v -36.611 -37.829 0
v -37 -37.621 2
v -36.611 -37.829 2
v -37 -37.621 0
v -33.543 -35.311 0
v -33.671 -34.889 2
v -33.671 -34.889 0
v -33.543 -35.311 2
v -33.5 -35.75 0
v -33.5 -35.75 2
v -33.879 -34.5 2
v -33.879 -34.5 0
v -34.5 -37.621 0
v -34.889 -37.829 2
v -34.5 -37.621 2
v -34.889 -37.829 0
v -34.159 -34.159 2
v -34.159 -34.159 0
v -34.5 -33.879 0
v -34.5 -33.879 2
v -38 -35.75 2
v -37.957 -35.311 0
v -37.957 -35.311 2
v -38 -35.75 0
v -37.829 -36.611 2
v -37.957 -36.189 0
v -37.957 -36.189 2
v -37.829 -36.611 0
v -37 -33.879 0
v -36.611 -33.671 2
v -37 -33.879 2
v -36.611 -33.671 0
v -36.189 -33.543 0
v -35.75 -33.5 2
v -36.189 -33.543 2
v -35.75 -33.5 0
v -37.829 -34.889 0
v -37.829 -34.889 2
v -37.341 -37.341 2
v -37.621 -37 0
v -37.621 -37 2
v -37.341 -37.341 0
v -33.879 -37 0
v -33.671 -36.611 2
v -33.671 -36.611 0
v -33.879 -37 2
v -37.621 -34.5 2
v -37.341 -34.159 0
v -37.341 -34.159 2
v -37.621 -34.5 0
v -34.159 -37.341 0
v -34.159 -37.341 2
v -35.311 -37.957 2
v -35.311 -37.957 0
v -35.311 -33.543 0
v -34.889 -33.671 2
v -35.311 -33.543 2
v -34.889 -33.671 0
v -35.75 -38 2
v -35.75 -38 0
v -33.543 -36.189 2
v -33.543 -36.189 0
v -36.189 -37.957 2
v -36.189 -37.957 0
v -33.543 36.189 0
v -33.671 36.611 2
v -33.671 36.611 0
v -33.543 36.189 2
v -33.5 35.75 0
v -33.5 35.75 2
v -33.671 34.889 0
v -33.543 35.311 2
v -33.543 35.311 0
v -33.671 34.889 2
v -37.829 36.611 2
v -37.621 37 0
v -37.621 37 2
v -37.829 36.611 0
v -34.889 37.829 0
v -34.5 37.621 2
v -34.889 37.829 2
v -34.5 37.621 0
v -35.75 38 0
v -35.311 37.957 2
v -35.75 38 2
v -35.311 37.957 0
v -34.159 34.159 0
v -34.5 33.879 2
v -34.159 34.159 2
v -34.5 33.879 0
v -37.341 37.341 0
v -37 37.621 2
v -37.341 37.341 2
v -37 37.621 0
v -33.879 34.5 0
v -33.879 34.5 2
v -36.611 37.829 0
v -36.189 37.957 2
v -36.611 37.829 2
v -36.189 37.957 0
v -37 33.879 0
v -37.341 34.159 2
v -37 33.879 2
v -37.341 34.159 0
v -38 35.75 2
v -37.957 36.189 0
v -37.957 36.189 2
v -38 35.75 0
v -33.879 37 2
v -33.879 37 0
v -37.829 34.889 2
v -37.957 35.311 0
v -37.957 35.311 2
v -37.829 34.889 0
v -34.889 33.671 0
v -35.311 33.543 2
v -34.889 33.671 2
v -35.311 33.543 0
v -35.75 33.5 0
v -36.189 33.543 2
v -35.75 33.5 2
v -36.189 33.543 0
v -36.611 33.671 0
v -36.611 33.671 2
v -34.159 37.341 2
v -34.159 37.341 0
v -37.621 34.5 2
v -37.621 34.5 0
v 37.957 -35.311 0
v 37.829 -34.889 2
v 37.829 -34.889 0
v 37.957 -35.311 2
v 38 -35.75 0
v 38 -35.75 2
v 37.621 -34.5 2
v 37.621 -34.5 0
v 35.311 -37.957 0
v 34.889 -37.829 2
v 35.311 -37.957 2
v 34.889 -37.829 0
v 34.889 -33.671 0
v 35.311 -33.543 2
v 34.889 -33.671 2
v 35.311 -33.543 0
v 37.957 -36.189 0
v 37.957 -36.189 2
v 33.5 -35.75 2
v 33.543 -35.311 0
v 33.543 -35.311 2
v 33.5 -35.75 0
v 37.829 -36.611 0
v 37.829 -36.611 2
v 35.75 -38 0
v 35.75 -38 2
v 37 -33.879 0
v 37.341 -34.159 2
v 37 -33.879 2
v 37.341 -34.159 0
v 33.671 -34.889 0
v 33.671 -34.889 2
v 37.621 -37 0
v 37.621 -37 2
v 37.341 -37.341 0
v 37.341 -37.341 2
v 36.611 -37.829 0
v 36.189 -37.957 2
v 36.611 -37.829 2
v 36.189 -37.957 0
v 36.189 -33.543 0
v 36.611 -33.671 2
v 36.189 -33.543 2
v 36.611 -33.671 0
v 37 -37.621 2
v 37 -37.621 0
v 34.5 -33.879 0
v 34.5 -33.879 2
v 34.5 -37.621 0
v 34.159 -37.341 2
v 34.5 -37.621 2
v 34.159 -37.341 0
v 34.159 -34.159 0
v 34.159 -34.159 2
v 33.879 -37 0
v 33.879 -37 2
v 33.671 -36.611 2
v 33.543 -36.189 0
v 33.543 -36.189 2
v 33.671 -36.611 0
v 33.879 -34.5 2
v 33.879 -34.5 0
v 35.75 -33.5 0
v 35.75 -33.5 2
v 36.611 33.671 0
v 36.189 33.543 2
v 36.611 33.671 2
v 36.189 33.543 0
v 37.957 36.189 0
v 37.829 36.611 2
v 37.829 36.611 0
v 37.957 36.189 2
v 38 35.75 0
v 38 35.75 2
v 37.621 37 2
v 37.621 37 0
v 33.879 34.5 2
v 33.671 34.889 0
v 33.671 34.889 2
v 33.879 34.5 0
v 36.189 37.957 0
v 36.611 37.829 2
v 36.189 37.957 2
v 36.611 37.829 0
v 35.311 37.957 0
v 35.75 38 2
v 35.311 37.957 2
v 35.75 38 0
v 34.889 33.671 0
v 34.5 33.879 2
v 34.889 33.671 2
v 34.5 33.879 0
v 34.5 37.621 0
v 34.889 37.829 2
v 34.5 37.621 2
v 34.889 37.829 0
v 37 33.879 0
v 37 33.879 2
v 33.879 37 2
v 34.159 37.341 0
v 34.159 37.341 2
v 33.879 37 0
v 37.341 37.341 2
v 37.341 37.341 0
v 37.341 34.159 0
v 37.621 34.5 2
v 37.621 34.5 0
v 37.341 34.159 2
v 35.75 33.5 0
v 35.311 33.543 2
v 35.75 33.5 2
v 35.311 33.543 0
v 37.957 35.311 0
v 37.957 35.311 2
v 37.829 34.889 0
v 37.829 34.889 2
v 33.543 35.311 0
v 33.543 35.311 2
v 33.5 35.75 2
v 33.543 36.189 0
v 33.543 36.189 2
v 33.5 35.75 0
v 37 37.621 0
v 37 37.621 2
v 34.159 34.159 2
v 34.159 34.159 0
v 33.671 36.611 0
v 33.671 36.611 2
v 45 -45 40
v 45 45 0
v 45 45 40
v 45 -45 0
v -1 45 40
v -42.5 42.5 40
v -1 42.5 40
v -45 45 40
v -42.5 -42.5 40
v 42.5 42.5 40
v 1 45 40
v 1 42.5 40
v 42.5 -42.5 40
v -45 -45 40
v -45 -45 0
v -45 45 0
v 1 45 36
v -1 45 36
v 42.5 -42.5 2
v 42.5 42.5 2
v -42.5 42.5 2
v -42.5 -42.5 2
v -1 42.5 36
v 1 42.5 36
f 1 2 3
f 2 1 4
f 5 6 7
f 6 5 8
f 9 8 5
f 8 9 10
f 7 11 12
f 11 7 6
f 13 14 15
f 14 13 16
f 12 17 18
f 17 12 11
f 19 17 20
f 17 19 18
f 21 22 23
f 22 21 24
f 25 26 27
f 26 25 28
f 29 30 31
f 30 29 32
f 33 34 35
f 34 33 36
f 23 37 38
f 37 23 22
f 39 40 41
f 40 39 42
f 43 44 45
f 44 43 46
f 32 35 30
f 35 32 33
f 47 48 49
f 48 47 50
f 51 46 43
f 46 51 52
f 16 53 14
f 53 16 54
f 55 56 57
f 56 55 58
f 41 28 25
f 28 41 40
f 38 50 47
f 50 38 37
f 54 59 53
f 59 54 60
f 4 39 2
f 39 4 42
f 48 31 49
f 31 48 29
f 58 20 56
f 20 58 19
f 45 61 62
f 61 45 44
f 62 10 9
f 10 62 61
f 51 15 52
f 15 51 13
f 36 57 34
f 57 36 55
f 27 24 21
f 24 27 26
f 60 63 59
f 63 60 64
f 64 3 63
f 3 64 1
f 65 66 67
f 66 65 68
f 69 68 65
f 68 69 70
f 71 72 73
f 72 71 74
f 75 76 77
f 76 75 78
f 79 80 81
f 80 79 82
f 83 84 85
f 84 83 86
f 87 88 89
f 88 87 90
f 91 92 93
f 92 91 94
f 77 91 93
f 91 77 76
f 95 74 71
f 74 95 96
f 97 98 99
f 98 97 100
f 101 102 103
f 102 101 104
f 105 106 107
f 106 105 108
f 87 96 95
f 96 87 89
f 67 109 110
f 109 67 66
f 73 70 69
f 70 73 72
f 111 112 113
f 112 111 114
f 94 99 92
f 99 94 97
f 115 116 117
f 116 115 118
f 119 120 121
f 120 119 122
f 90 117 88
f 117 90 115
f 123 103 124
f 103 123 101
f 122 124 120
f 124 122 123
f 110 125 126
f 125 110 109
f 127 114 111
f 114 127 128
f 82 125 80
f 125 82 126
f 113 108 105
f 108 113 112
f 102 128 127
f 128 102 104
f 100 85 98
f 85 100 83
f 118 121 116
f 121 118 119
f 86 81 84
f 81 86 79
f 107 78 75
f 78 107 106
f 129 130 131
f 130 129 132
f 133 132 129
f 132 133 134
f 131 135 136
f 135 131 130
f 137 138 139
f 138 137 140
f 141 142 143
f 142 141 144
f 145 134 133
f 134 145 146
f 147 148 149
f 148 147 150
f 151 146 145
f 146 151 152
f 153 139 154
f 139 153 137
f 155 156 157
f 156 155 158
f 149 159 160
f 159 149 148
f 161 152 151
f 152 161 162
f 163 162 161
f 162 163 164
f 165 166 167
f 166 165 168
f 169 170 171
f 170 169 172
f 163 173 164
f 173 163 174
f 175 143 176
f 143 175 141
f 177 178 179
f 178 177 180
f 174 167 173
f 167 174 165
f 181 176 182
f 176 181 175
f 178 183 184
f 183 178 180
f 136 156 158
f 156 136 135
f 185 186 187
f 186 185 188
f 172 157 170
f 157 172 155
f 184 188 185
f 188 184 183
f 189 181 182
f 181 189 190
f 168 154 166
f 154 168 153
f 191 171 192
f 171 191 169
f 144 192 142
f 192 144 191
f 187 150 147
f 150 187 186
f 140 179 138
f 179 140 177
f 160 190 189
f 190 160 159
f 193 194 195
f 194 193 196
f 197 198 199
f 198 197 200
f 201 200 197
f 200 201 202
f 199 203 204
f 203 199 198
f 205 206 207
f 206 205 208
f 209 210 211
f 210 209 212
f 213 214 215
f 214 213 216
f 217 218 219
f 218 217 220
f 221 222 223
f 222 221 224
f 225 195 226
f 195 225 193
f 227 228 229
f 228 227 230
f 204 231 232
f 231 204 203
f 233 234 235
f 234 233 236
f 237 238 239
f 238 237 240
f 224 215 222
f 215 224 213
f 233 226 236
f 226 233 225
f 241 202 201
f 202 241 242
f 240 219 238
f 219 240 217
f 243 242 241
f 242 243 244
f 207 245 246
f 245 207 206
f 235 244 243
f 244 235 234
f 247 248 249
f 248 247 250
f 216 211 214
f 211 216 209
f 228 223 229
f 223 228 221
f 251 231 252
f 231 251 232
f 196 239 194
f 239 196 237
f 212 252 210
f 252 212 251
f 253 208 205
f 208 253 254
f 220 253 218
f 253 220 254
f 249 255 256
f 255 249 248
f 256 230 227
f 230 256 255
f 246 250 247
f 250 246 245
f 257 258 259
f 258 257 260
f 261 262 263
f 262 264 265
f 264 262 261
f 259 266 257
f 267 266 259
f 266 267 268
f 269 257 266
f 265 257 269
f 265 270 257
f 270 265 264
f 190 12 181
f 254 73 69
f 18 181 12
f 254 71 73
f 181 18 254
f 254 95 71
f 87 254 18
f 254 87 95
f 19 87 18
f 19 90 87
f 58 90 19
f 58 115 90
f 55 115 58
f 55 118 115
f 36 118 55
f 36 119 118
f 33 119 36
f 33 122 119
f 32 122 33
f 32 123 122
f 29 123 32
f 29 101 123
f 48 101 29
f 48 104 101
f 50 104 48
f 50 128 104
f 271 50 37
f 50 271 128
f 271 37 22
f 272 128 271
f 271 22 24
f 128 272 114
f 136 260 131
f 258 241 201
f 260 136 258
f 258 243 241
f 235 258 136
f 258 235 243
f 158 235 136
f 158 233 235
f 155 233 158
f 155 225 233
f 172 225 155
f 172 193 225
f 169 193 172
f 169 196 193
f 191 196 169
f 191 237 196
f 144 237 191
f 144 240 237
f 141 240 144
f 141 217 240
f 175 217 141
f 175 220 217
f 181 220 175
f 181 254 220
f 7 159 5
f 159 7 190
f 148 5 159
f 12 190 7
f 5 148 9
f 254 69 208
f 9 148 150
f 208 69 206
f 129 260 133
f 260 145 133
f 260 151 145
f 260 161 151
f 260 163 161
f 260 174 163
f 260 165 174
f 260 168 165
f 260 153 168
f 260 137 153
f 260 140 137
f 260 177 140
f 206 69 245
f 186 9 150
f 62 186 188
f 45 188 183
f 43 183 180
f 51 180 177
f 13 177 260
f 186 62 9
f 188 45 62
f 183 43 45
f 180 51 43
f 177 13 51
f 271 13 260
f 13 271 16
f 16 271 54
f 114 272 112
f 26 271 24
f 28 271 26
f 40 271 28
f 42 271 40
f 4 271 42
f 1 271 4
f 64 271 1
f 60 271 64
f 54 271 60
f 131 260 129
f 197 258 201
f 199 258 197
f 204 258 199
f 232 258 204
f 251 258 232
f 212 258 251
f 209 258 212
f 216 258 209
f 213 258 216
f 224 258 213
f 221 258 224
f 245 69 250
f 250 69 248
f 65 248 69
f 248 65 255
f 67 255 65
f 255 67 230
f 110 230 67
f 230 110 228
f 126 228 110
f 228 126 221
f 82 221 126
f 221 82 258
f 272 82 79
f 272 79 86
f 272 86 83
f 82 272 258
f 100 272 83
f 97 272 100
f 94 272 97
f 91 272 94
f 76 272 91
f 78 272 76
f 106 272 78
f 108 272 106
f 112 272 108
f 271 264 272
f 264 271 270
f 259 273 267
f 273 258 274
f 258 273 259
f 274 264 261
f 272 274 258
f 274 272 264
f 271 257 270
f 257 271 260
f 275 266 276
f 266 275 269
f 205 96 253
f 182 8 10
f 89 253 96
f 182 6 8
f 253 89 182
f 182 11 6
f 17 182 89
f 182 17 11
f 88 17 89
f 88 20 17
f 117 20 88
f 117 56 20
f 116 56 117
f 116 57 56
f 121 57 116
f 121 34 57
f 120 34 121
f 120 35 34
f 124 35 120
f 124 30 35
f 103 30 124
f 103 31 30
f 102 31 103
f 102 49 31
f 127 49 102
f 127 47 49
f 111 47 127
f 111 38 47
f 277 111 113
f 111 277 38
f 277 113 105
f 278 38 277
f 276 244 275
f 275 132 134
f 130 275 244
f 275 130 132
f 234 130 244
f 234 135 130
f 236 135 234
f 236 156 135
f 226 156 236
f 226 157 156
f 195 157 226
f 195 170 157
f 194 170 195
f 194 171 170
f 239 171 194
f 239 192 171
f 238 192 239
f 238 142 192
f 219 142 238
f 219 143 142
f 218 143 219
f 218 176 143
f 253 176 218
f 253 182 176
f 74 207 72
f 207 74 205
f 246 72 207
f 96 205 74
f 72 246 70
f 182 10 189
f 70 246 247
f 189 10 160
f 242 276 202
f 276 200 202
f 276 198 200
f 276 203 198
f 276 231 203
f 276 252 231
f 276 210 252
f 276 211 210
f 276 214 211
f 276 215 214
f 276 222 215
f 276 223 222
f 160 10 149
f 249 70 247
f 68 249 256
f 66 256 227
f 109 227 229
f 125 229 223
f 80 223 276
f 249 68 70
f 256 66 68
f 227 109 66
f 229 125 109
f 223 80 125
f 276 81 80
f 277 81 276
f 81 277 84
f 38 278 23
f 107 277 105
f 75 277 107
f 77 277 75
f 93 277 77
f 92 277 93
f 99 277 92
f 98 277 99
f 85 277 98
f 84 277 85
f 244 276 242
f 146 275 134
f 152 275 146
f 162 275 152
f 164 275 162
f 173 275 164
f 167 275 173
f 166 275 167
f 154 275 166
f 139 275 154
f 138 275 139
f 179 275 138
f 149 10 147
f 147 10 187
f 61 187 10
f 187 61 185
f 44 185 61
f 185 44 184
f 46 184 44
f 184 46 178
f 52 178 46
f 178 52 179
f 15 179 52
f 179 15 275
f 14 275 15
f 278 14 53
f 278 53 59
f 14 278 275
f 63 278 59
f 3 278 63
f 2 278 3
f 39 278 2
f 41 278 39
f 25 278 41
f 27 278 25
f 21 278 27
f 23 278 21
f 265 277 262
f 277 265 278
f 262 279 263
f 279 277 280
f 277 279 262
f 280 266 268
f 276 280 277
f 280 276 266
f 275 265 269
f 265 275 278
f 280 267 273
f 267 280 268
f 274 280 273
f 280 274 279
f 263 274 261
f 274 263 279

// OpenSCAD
// Housing for a DIY magnetic stirrer built from an 80 mm PC fan
// Category: full hardware. Glue two magnets to the fan hub, screw the fan under the
// top plate, power it with a 12 V supply + PWM speed controller.
// Modelled in print orientation: upside down, top plate on the bed.
// Print: PETG or PLA, 0.2 mm layers, 15 % infill.
// SPDX-License-Identifier: CERN-OHL-P-2.0

/* [Housing] */
outer = [90, 90, 40];  // X, Y, height [mm]
wall = 2.5;
top_t = 2;             // stir surface; thin keeps magnets close to the stir bar
fan_hole_d = 4.5;      // M4 clearance
fan_hole_spacing = 71.5; // 80 mm fan mounting pattern
notch = [2, 4];       // cable notch width x depth, from the open edge

/* [Hidden] */
$fn = 32;
eps = 0.01;

difference() {
    translate([-outer.x / 2, -outer.y / 2, 0]) cube(outer);
    translate([-outer.x / 2 + wall, -outer.y / 2 + wall, top_t])
        cube([outer.x - 2 * wall, outer.y - 2 * wall, outer.z]);
    for (sx = [-1, 1], sy = [-1, 1])
        translate([sx * fan_hole_spacing / 2, sy * fan_hole_spacing / 2, -eps])
            cylinder(d = fan_hole_d, h = top_t + 2 * eps);
    translate([-notch.x / 2, outer.y / 2 - wall - 1, outer.z - notch.y])
        cube([notch.x, wall + 2, notch.y + eps]);
}
